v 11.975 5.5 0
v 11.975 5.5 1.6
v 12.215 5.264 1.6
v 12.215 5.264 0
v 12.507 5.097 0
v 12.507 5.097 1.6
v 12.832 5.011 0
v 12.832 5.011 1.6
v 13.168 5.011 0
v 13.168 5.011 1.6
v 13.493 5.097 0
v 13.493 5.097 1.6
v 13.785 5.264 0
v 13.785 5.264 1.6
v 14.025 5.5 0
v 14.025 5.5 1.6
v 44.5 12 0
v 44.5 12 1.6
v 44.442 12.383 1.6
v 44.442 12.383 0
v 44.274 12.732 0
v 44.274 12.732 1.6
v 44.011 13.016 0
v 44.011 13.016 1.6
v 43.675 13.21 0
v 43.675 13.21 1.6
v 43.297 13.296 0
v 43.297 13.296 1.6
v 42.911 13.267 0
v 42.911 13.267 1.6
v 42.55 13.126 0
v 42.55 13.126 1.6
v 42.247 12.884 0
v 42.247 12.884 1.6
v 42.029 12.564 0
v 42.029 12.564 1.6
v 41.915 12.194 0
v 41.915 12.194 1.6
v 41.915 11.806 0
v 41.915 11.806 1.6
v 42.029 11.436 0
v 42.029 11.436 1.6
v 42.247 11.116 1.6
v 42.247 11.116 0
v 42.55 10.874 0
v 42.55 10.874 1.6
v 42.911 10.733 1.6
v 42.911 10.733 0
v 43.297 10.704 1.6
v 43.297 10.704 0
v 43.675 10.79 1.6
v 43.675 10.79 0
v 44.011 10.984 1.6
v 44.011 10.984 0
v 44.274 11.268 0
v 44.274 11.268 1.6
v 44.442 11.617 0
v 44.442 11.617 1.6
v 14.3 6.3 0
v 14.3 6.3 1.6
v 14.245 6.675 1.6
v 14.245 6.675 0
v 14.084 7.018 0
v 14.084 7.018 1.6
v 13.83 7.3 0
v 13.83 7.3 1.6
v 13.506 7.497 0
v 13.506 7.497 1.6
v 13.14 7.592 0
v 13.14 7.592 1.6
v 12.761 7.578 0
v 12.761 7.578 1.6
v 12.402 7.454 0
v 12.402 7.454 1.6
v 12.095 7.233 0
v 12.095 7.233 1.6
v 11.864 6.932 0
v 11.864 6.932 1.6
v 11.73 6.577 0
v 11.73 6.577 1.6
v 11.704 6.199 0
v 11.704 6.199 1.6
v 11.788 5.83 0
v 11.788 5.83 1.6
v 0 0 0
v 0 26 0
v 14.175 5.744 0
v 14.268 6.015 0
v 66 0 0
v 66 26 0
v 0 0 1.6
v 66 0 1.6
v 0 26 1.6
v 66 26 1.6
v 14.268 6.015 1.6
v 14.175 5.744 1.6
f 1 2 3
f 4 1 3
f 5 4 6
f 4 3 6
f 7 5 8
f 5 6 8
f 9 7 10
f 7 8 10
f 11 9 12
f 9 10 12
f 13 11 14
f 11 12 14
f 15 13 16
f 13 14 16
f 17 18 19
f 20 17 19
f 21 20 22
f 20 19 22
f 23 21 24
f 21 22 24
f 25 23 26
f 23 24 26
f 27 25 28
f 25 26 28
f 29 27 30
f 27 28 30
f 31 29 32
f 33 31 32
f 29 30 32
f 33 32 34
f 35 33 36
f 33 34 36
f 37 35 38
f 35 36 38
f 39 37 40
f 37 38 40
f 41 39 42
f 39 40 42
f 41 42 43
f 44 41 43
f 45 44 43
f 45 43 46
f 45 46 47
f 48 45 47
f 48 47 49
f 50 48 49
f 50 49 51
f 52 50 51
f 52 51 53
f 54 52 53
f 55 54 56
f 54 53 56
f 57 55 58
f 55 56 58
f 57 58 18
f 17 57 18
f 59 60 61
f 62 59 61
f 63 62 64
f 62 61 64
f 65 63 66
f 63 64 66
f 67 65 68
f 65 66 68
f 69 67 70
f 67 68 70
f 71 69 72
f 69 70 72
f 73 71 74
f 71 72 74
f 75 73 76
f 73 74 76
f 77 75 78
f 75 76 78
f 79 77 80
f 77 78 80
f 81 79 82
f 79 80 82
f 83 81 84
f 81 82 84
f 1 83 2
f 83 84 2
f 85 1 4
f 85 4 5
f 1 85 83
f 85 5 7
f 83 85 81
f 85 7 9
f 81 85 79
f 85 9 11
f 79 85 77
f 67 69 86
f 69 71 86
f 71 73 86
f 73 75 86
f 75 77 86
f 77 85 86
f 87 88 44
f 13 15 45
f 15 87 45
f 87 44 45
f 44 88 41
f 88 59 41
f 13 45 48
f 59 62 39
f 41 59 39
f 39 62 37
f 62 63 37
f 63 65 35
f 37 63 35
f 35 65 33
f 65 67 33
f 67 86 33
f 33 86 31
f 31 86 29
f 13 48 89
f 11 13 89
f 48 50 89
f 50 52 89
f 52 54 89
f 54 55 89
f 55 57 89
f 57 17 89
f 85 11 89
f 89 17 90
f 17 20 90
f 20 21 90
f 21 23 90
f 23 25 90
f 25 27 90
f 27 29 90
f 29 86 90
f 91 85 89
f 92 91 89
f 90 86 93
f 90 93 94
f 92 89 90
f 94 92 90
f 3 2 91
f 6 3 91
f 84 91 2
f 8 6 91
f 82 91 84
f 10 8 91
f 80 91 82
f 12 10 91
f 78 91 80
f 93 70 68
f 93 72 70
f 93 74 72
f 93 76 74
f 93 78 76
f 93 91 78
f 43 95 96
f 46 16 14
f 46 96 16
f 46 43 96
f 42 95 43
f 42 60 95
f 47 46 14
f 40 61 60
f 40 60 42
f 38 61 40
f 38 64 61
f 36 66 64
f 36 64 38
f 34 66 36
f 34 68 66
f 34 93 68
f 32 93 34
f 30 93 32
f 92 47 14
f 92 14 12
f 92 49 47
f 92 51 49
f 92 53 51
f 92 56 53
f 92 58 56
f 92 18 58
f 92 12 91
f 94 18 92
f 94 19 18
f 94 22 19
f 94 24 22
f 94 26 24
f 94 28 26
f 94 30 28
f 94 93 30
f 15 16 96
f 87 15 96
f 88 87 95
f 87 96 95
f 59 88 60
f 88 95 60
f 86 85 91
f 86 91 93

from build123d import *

# Parameters (mm, degrees)
F0_W     = 66
F0_H     = 26
F1_DEPTH = 1.6
F3_R     = 1.3
F4_DEPTH = 1.6


with BuildPart() as f1:
    # F0 (on Top) → F1 (new body)
    with BuildSketch(Plane.XY):
        with Locations((33, 13)):
            Rectangle(F0_W, F0_H)
    extrude(amount=F1_DEPTH)

    # F3 (on face) → F4 (cut, through all)
    with BuildSketch(Plane.XY.offset(1.6)):
        with BuildLine():
            Line((14.0246950766, 5.5), (11.9753049234, 5.5))
            ThreePointArc((11.9753049234, 5.5), (13, 5), (14.0246950766, 5.5))
        make_face()
        with BuildLine():
            ThreePointArc((14.0246950766, 5.5), (14.2292484695, 5.8769773053), (14.3, 6.3))
            ThreePointArc((14.3, 6.3), (12.5769773053, 7.5292484695), (11.9753049234, 5.5))
            Line((11.9753049234, 5.5), (14.0246950766, 5.5))
        make_face()
        with Locations((43.2, 12)):
            Circle(F3_R)
    extrude(amount=-F4_DEPTH, mode=Mode.SUBTRACT)


solid = f1.part
